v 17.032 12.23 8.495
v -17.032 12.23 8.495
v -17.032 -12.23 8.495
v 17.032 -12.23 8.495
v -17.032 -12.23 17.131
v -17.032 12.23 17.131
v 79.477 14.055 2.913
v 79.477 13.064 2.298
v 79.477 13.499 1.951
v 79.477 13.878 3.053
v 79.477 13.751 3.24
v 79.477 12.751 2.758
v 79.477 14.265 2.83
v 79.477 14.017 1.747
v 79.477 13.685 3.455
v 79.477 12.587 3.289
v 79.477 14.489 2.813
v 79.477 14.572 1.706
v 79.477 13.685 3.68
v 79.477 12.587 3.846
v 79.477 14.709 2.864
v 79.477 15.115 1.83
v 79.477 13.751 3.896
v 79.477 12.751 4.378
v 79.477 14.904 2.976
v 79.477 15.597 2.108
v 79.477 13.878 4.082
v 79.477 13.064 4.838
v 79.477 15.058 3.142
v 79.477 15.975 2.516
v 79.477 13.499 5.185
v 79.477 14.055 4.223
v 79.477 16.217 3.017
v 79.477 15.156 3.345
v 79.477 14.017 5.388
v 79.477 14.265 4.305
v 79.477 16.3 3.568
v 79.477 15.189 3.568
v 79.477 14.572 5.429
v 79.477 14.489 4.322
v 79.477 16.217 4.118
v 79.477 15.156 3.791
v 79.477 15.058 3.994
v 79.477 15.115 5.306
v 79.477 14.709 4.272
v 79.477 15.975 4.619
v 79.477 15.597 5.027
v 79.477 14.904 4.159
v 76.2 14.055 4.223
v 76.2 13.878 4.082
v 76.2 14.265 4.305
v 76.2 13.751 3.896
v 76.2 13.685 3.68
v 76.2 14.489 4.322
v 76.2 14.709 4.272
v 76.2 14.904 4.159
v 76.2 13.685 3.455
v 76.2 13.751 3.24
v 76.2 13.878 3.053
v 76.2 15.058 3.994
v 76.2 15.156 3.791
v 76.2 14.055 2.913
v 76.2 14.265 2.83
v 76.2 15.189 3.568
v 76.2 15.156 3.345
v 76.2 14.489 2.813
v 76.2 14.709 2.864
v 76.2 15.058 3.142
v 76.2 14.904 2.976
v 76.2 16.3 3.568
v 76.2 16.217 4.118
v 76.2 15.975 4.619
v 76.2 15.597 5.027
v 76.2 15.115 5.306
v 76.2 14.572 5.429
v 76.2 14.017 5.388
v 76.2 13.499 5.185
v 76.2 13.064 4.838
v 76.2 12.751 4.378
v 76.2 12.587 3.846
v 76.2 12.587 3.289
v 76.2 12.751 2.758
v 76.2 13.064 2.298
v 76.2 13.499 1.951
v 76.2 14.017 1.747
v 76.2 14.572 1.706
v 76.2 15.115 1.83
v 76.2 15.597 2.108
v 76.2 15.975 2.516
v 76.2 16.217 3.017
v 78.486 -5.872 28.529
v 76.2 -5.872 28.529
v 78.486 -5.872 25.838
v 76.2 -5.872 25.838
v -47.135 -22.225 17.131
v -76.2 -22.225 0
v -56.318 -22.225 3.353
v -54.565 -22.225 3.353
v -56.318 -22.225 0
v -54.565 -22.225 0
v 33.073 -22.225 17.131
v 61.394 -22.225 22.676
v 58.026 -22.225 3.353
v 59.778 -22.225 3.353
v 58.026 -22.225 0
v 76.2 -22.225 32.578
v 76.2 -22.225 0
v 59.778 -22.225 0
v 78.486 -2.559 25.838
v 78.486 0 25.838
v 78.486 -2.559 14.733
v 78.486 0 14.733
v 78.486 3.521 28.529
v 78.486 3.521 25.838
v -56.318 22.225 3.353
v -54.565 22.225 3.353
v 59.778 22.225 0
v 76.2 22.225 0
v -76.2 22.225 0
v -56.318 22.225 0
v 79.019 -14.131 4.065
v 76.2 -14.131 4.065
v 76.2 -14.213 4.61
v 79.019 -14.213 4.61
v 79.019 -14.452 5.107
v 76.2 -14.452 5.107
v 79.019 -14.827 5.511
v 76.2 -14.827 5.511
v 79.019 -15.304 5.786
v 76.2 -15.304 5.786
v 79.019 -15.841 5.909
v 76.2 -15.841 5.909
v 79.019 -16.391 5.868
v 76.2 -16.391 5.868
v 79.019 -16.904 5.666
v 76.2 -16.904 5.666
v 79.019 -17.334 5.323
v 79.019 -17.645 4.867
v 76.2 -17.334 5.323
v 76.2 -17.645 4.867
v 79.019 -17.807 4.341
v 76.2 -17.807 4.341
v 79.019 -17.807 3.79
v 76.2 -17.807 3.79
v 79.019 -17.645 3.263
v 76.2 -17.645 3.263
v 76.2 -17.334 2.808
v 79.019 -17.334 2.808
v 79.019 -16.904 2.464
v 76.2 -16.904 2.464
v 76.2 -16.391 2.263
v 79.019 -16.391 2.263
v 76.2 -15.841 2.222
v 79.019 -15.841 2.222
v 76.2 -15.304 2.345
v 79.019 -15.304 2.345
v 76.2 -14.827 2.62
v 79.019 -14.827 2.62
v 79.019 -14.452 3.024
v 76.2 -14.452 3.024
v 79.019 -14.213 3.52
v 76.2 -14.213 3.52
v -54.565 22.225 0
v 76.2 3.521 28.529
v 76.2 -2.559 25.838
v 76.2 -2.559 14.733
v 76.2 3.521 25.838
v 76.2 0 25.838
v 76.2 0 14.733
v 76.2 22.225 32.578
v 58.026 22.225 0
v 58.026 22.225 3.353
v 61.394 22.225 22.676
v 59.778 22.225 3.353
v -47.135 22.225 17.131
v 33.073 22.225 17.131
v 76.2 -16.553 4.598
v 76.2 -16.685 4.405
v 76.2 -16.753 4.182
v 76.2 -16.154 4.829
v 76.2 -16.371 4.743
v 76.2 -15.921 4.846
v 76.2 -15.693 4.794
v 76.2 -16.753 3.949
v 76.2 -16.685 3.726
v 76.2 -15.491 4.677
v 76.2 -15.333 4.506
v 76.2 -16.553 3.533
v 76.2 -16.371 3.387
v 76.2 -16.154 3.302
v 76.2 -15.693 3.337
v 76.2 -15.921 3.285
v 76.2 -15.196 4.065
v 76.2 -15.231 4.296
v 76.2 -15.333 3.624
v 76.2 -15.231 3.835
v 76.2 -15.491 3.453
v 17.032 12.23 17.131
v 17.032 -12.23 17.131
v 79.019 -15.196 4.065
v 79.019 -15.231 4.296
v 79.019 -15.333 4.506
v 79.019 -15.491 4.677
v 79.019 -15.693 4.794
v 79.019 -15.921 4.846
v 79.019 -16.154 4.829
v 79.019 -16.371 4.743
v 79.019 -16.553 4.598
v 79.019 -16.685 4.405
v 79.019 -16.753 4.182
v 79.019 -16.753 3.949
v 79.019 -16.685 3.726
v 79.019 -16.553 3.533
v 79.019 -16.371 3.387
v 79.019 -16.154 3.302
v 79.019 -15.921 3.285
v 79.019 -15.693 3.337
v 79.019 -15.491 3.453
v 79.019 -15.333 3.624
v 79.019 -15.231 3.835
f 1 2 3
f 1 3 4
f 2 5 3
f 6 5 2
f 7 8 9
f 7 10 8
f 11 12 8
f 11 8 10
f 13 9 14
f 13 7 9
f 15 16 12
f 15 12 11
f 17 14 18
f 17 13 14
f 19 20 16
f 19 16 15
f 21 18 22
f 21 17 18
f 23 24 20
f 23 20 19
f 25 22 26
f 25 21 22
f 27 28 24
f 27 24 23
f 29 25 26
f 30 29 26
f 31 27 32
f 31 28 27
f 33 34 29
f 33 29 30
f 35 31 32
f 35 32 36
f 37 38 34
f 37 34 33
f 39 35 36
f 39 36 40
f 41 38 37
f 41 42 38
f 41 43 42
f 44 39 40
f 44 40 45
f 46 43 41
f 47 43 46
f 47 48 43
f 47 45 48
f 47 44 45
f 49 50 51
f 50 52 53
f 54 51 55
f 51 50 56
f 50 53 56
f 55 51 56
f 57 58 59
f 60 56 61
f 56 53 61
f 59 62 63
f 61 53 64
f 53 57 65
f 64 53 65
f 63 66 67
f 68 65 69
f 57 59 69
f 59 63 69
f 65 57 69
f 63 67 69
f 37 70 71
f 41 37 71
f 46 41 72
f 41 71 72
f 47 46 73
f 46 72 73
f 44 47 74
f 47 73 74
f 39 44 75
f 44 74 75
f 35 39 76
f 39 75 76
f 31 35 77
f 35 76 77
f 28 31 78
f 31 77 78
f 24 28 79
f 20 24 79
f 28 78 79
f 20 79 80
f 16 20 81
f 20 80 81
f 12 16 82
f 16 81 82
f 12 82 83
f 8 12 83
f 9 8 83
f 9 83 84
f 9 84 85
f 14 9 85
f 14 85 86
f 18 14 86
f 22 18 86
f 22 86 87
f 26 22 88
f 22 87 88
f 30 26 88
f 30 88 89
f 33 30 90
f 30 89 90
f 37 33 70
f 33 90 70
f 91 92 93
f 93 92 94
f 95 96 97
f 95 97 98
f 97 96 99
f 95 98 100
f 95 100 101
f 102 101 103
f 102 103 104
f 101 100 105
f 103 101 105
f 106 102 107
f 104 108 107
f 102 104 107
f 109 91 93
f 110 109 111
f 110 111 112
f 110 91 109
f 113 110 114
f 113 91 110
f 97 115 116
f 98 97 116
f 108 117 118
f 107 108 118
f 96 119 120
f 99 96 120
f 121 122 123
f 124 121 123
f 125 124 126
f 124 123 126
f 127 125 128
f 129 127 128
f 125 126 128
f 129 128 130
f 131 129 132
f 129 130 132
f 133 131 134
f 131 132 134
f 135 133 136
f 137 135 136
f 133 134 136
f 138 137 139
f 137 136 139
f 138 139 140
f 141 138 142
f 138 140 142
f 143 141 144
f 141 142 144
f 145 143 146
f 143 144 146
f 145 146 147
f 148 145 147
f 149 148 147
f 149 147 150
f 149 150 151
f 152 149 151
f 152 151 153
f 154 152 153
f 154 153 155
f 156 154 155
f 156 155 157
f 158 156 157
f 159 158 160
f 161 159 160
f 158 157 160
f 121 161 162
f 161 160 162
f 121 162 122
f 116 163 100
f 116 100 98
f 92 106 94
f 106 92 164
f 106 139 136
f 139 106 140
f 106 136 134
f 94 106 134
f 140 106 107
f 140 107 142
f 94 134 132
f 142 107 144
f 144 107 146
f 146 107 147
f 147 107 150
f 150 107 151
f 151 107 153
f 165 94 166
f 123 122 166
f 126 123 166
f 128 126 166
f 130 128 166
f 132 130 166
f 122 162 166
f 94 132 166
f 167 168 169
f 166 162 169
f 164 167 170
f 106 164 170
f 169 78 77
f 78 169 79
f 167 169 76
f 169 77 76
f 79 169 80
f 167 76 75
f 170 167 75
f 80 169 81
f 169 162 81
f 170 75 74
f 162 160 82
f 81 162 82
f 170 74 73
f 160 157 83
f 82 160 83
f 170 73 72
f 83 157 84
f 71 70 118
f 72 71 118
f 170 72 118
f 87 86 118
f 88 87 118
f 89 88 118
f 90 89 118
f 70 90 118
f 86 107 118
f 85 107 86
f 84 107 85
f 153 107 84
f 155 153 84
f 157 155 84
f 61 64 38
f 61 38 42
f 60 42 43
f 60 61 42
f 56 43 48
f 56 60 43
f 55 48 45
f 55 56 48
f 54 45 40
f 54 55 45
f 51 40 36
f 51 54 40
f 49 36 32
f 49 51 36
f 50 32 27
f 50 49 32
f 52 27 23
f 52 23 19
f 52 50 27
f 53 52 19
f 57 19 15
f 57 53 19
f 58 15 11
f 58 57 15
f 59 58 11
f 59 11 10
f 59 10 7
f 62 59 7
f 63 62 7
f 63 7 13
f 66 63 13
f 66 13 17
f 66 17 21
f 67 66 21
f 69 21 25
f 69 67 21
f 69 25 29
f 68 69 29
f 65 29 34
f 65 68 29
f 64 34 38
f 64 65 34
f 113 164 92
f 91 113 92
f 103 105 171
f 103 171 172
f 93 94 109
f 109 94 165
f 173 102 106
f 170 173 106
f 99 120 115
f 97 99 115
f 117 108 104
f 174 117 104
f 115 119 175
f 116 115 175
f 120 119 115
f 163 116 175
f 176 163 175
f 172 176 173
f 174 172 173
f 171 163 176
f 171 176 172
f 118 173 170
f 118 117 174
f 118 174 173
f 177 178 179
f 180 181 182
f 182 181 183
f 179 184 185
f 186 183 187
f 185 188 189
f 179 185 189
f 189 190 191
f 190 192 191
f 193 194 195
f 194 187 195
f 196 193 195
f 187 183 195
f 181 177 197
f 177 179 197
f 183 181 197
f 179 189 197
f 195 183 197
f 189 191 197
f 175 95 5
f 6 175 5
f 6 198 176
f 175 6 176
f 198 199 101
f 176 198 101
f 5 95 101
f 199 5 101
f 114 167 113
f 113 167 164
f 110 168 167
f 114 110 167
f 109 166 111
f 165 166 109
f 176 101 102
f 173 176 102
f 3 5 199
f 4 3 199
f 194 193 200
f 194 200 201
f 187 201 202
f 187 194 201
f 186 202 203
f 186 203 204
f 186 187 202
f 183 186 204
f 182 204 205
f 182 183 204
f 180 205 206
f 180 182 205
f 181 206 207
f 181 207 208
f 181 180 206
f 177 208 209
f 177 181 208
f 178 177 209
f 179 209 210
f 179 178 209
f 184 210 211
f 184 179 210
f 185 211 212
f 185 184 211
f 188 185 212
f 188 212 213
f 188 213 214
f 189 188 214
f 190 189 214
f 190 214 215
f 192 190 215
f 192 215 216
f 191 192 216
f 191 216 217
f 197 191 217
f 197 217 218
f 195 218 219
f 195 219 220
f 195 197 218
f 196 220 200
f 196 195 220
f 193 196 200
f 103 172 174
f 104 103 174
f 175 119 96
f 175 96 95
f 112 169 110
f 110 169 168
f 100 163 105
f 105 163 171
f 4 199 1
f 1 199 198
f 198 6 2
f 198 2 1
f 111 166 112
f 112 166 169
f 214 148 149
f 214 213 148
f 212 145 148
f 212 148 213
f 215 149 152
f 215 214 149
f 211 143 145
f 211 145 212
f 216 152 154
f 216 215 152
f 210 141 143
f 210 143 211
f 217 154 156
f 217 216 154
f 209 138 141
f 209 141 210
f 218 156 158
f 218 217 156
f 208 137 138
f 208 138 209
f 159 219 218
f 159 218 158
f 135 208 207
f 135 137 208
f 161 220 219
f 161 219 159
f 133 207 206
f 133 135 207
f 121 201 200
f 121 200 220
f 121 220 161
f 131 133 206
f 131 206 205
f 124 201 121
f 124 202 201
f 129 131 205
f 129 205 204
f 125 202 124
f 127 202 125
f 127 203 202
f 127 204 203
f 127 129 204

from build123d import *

# Parameters (mm, degrees)
F0_W      = 152.4
F0_H      = 44.45
F1_DEPTH  = 38.1
F3_DEPTH  = 87.376
F4_W      = 34.063664
F4_H      = 24.459008
F5_DEPTH  = 8.636
F6_W      = 1.7526
F6_H      = 12.453256
F7_DEPTH  = 71.12
F8_W      = 1.7526
F8_H      = 5.531359
F9_DEPTH  = 63.2968
F10_R     = 1.848563
F10_R_2   = 0.78284
F11_DEPTH = 2.8194
F12_R     = 1.867057
F12_R_2   = 0.756279
F13_DEPTH = 3.2766
F14_W     = 2.55886
F14_H     = 11.105731
F15_DEPTH = 2.286


with BuildPart() as f1:
    # F0 (on Top) → F1 (new body)
    with BuildSketch(Plane.XY):
        Rectangle(F0_W, F0_H)
    extrude(amount=F1_DEPTH)

    # F2 (on face) → F3 (cut)
    with BuildSketch(Plane.XZ.offset(22.225)):
        Polygon((-92.090726, 33.964641), (-76.2, 0), (-47.134604, 17.130854), (33.073444, 17.130854), (61.393816, 22.676103), (76.2, 32.57833), (86.743511, 41.292287), (-31.291042, 57.729989), align=None)
    extrude(amount=-F3_DEPTH, mode=Mode.SUBTRACT)

    # F4 (on face) → F5 (cut)
    with BuildSketch(Plane.XY.offset(17.130854)):
        Rectangle(F4_W, F4_H)
    extrude(amount=-F5_DEPTH, mode=Mode.SUBTRACT)

    # F6 (on face) → F7 (cut)
    with BuildSketch(Plane.XZ.offset(22.225)):
        with Locations((-55.441208, -2.873828)):
            Rectangle(F6_W, F6_H)
    extrude(amount=-F7_DEPTH, mode=Mode.SUBTRACT)

    # F8 (on face) → F9 (cut)
    with BuildSketch(Plane.XZ.offset(22.225)):
        with Locations((58.901841, 0.58712)):
            Rectangle(F8_W, F8_H)
    extrude(amount=-F9_DEPTH, mode=Mode.SUBTRACT)

    # F10 (on face) → F11 (join)
    with BuildSketch(Plane.YZ.offset(76.2)):
        with Locations((-15.979337, 4.065371)):
            Circle(F10_R)
        with Locations((-15.979337, 4.065371)):
            Circle(F10_R_2, mode=Mode.SUBTRACT)
    extrude(amount=F11_DEPTH)

    # F12 (on face) → F13 (join)
    with BuildSketch(Plane.YZ.offset(76.2)):
        with Locations((14.432833, 3.567662)):
            Circle(F12_R)
        with Locations((14.432833, 3.567662)):
            Circle(F12_R_2, mode=Mode.SUBTRACT)
    extrude(amount=F13_DEPTH)

    # F14 (on face) → F15 (join)
    with BuildSketch(Plane.YZ.offset(76.2)):
        Polygon((-5.871529, 25.838383), (-2.55886, 25.838383), (0, 25.838383), (3.520685, 25.838383), (3.520685, 28.528722), (-5.871529, 28.528722), align=None)
        with Locations((-1.27943, 20.285518)):
            Rectangle(F14_W, F14_H)
    extrude(amount=F15_DEPTH)


solid = f1.part
